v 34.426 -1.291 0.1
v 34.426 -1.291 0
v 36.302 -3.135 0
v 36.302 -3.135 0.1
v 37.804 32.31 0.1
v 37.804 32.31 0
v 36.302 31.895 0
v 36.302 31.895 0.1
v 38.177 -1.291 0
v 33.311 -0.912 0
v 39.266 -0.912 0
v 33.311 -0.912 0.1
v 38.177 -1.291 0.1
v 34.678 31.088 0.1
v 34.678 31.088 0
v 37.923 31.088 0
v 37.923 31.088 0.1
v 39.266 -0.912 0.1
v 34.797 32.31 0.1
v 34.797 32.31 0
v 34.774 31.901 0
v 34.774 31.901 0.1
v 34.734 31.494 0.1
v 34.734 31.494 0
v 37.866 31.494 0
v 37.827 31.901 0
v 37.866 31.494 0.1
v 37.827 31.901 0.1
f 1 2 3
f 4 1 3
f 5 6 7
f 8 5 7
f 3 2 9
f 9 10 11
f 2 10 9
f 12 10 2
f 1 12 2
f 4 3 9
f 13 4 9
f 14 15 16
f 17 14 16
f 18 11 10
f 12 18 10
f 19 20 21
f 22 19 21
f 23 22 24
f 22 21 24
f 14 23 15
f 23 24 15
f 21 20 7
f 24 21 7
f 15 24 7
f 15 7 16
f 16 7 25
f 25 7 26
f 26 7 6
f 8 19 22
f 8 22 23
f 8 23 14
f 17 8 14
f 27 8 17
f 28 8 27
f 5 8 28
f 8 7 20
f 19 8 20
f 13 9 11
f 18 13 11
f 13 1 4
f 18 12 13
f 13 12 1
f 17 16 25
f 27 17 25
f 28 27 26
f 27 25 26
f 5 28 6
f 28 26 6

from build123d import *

# Parameters (mm, degrees)
SALIENTE_EXTRUIR1_DEPTH   = 0.1
SALIENTE_EXTRUIR1_2_DEPTH = 0.1


with BuildPart() as part:
    # Model → Saliente-Extruir1 (new body)
    with BuildSketch(Plane.XY):
        Polygon((39.265808306, -0.911572929), (33.311070818, -0.911572929), (34.426407672, -1.291216959), (36.301941466, -3.135018824), (38.177300109, -1.291038811), align=None)
    extrude(amount=SALIENTE_EXTRUIR1_DEPTH)


with BuildPart() as body_2:
    # Model → Saliente-Extruir1 2 (new body)
    with BuildSketch(Plane.XY):
        with BuildLine():
            Line((34.677881776, 31.088427071), (37.922774876, 31.088427071))
            ThreePointArc((37.922774876, 31.088427071), (37.844578192, 31.69749464), (37.803876403, 32.310211043))
            Line((37.803876403, 32.310211043), (36.301776991, 31.895347329))
            Line((36.301776991, 31.895347329), (34.796639594, 32.310068214))
            ThreePointArc((34.796639594, 32.310068214), (34.756003558, 31.697425616), (34.677881776, 31.088427071))
        make_face()
    extrude(amount=SALIENTE_EXTRUIR1_2_DEPTH)


solid = Compound([part.part, body_2.part])
